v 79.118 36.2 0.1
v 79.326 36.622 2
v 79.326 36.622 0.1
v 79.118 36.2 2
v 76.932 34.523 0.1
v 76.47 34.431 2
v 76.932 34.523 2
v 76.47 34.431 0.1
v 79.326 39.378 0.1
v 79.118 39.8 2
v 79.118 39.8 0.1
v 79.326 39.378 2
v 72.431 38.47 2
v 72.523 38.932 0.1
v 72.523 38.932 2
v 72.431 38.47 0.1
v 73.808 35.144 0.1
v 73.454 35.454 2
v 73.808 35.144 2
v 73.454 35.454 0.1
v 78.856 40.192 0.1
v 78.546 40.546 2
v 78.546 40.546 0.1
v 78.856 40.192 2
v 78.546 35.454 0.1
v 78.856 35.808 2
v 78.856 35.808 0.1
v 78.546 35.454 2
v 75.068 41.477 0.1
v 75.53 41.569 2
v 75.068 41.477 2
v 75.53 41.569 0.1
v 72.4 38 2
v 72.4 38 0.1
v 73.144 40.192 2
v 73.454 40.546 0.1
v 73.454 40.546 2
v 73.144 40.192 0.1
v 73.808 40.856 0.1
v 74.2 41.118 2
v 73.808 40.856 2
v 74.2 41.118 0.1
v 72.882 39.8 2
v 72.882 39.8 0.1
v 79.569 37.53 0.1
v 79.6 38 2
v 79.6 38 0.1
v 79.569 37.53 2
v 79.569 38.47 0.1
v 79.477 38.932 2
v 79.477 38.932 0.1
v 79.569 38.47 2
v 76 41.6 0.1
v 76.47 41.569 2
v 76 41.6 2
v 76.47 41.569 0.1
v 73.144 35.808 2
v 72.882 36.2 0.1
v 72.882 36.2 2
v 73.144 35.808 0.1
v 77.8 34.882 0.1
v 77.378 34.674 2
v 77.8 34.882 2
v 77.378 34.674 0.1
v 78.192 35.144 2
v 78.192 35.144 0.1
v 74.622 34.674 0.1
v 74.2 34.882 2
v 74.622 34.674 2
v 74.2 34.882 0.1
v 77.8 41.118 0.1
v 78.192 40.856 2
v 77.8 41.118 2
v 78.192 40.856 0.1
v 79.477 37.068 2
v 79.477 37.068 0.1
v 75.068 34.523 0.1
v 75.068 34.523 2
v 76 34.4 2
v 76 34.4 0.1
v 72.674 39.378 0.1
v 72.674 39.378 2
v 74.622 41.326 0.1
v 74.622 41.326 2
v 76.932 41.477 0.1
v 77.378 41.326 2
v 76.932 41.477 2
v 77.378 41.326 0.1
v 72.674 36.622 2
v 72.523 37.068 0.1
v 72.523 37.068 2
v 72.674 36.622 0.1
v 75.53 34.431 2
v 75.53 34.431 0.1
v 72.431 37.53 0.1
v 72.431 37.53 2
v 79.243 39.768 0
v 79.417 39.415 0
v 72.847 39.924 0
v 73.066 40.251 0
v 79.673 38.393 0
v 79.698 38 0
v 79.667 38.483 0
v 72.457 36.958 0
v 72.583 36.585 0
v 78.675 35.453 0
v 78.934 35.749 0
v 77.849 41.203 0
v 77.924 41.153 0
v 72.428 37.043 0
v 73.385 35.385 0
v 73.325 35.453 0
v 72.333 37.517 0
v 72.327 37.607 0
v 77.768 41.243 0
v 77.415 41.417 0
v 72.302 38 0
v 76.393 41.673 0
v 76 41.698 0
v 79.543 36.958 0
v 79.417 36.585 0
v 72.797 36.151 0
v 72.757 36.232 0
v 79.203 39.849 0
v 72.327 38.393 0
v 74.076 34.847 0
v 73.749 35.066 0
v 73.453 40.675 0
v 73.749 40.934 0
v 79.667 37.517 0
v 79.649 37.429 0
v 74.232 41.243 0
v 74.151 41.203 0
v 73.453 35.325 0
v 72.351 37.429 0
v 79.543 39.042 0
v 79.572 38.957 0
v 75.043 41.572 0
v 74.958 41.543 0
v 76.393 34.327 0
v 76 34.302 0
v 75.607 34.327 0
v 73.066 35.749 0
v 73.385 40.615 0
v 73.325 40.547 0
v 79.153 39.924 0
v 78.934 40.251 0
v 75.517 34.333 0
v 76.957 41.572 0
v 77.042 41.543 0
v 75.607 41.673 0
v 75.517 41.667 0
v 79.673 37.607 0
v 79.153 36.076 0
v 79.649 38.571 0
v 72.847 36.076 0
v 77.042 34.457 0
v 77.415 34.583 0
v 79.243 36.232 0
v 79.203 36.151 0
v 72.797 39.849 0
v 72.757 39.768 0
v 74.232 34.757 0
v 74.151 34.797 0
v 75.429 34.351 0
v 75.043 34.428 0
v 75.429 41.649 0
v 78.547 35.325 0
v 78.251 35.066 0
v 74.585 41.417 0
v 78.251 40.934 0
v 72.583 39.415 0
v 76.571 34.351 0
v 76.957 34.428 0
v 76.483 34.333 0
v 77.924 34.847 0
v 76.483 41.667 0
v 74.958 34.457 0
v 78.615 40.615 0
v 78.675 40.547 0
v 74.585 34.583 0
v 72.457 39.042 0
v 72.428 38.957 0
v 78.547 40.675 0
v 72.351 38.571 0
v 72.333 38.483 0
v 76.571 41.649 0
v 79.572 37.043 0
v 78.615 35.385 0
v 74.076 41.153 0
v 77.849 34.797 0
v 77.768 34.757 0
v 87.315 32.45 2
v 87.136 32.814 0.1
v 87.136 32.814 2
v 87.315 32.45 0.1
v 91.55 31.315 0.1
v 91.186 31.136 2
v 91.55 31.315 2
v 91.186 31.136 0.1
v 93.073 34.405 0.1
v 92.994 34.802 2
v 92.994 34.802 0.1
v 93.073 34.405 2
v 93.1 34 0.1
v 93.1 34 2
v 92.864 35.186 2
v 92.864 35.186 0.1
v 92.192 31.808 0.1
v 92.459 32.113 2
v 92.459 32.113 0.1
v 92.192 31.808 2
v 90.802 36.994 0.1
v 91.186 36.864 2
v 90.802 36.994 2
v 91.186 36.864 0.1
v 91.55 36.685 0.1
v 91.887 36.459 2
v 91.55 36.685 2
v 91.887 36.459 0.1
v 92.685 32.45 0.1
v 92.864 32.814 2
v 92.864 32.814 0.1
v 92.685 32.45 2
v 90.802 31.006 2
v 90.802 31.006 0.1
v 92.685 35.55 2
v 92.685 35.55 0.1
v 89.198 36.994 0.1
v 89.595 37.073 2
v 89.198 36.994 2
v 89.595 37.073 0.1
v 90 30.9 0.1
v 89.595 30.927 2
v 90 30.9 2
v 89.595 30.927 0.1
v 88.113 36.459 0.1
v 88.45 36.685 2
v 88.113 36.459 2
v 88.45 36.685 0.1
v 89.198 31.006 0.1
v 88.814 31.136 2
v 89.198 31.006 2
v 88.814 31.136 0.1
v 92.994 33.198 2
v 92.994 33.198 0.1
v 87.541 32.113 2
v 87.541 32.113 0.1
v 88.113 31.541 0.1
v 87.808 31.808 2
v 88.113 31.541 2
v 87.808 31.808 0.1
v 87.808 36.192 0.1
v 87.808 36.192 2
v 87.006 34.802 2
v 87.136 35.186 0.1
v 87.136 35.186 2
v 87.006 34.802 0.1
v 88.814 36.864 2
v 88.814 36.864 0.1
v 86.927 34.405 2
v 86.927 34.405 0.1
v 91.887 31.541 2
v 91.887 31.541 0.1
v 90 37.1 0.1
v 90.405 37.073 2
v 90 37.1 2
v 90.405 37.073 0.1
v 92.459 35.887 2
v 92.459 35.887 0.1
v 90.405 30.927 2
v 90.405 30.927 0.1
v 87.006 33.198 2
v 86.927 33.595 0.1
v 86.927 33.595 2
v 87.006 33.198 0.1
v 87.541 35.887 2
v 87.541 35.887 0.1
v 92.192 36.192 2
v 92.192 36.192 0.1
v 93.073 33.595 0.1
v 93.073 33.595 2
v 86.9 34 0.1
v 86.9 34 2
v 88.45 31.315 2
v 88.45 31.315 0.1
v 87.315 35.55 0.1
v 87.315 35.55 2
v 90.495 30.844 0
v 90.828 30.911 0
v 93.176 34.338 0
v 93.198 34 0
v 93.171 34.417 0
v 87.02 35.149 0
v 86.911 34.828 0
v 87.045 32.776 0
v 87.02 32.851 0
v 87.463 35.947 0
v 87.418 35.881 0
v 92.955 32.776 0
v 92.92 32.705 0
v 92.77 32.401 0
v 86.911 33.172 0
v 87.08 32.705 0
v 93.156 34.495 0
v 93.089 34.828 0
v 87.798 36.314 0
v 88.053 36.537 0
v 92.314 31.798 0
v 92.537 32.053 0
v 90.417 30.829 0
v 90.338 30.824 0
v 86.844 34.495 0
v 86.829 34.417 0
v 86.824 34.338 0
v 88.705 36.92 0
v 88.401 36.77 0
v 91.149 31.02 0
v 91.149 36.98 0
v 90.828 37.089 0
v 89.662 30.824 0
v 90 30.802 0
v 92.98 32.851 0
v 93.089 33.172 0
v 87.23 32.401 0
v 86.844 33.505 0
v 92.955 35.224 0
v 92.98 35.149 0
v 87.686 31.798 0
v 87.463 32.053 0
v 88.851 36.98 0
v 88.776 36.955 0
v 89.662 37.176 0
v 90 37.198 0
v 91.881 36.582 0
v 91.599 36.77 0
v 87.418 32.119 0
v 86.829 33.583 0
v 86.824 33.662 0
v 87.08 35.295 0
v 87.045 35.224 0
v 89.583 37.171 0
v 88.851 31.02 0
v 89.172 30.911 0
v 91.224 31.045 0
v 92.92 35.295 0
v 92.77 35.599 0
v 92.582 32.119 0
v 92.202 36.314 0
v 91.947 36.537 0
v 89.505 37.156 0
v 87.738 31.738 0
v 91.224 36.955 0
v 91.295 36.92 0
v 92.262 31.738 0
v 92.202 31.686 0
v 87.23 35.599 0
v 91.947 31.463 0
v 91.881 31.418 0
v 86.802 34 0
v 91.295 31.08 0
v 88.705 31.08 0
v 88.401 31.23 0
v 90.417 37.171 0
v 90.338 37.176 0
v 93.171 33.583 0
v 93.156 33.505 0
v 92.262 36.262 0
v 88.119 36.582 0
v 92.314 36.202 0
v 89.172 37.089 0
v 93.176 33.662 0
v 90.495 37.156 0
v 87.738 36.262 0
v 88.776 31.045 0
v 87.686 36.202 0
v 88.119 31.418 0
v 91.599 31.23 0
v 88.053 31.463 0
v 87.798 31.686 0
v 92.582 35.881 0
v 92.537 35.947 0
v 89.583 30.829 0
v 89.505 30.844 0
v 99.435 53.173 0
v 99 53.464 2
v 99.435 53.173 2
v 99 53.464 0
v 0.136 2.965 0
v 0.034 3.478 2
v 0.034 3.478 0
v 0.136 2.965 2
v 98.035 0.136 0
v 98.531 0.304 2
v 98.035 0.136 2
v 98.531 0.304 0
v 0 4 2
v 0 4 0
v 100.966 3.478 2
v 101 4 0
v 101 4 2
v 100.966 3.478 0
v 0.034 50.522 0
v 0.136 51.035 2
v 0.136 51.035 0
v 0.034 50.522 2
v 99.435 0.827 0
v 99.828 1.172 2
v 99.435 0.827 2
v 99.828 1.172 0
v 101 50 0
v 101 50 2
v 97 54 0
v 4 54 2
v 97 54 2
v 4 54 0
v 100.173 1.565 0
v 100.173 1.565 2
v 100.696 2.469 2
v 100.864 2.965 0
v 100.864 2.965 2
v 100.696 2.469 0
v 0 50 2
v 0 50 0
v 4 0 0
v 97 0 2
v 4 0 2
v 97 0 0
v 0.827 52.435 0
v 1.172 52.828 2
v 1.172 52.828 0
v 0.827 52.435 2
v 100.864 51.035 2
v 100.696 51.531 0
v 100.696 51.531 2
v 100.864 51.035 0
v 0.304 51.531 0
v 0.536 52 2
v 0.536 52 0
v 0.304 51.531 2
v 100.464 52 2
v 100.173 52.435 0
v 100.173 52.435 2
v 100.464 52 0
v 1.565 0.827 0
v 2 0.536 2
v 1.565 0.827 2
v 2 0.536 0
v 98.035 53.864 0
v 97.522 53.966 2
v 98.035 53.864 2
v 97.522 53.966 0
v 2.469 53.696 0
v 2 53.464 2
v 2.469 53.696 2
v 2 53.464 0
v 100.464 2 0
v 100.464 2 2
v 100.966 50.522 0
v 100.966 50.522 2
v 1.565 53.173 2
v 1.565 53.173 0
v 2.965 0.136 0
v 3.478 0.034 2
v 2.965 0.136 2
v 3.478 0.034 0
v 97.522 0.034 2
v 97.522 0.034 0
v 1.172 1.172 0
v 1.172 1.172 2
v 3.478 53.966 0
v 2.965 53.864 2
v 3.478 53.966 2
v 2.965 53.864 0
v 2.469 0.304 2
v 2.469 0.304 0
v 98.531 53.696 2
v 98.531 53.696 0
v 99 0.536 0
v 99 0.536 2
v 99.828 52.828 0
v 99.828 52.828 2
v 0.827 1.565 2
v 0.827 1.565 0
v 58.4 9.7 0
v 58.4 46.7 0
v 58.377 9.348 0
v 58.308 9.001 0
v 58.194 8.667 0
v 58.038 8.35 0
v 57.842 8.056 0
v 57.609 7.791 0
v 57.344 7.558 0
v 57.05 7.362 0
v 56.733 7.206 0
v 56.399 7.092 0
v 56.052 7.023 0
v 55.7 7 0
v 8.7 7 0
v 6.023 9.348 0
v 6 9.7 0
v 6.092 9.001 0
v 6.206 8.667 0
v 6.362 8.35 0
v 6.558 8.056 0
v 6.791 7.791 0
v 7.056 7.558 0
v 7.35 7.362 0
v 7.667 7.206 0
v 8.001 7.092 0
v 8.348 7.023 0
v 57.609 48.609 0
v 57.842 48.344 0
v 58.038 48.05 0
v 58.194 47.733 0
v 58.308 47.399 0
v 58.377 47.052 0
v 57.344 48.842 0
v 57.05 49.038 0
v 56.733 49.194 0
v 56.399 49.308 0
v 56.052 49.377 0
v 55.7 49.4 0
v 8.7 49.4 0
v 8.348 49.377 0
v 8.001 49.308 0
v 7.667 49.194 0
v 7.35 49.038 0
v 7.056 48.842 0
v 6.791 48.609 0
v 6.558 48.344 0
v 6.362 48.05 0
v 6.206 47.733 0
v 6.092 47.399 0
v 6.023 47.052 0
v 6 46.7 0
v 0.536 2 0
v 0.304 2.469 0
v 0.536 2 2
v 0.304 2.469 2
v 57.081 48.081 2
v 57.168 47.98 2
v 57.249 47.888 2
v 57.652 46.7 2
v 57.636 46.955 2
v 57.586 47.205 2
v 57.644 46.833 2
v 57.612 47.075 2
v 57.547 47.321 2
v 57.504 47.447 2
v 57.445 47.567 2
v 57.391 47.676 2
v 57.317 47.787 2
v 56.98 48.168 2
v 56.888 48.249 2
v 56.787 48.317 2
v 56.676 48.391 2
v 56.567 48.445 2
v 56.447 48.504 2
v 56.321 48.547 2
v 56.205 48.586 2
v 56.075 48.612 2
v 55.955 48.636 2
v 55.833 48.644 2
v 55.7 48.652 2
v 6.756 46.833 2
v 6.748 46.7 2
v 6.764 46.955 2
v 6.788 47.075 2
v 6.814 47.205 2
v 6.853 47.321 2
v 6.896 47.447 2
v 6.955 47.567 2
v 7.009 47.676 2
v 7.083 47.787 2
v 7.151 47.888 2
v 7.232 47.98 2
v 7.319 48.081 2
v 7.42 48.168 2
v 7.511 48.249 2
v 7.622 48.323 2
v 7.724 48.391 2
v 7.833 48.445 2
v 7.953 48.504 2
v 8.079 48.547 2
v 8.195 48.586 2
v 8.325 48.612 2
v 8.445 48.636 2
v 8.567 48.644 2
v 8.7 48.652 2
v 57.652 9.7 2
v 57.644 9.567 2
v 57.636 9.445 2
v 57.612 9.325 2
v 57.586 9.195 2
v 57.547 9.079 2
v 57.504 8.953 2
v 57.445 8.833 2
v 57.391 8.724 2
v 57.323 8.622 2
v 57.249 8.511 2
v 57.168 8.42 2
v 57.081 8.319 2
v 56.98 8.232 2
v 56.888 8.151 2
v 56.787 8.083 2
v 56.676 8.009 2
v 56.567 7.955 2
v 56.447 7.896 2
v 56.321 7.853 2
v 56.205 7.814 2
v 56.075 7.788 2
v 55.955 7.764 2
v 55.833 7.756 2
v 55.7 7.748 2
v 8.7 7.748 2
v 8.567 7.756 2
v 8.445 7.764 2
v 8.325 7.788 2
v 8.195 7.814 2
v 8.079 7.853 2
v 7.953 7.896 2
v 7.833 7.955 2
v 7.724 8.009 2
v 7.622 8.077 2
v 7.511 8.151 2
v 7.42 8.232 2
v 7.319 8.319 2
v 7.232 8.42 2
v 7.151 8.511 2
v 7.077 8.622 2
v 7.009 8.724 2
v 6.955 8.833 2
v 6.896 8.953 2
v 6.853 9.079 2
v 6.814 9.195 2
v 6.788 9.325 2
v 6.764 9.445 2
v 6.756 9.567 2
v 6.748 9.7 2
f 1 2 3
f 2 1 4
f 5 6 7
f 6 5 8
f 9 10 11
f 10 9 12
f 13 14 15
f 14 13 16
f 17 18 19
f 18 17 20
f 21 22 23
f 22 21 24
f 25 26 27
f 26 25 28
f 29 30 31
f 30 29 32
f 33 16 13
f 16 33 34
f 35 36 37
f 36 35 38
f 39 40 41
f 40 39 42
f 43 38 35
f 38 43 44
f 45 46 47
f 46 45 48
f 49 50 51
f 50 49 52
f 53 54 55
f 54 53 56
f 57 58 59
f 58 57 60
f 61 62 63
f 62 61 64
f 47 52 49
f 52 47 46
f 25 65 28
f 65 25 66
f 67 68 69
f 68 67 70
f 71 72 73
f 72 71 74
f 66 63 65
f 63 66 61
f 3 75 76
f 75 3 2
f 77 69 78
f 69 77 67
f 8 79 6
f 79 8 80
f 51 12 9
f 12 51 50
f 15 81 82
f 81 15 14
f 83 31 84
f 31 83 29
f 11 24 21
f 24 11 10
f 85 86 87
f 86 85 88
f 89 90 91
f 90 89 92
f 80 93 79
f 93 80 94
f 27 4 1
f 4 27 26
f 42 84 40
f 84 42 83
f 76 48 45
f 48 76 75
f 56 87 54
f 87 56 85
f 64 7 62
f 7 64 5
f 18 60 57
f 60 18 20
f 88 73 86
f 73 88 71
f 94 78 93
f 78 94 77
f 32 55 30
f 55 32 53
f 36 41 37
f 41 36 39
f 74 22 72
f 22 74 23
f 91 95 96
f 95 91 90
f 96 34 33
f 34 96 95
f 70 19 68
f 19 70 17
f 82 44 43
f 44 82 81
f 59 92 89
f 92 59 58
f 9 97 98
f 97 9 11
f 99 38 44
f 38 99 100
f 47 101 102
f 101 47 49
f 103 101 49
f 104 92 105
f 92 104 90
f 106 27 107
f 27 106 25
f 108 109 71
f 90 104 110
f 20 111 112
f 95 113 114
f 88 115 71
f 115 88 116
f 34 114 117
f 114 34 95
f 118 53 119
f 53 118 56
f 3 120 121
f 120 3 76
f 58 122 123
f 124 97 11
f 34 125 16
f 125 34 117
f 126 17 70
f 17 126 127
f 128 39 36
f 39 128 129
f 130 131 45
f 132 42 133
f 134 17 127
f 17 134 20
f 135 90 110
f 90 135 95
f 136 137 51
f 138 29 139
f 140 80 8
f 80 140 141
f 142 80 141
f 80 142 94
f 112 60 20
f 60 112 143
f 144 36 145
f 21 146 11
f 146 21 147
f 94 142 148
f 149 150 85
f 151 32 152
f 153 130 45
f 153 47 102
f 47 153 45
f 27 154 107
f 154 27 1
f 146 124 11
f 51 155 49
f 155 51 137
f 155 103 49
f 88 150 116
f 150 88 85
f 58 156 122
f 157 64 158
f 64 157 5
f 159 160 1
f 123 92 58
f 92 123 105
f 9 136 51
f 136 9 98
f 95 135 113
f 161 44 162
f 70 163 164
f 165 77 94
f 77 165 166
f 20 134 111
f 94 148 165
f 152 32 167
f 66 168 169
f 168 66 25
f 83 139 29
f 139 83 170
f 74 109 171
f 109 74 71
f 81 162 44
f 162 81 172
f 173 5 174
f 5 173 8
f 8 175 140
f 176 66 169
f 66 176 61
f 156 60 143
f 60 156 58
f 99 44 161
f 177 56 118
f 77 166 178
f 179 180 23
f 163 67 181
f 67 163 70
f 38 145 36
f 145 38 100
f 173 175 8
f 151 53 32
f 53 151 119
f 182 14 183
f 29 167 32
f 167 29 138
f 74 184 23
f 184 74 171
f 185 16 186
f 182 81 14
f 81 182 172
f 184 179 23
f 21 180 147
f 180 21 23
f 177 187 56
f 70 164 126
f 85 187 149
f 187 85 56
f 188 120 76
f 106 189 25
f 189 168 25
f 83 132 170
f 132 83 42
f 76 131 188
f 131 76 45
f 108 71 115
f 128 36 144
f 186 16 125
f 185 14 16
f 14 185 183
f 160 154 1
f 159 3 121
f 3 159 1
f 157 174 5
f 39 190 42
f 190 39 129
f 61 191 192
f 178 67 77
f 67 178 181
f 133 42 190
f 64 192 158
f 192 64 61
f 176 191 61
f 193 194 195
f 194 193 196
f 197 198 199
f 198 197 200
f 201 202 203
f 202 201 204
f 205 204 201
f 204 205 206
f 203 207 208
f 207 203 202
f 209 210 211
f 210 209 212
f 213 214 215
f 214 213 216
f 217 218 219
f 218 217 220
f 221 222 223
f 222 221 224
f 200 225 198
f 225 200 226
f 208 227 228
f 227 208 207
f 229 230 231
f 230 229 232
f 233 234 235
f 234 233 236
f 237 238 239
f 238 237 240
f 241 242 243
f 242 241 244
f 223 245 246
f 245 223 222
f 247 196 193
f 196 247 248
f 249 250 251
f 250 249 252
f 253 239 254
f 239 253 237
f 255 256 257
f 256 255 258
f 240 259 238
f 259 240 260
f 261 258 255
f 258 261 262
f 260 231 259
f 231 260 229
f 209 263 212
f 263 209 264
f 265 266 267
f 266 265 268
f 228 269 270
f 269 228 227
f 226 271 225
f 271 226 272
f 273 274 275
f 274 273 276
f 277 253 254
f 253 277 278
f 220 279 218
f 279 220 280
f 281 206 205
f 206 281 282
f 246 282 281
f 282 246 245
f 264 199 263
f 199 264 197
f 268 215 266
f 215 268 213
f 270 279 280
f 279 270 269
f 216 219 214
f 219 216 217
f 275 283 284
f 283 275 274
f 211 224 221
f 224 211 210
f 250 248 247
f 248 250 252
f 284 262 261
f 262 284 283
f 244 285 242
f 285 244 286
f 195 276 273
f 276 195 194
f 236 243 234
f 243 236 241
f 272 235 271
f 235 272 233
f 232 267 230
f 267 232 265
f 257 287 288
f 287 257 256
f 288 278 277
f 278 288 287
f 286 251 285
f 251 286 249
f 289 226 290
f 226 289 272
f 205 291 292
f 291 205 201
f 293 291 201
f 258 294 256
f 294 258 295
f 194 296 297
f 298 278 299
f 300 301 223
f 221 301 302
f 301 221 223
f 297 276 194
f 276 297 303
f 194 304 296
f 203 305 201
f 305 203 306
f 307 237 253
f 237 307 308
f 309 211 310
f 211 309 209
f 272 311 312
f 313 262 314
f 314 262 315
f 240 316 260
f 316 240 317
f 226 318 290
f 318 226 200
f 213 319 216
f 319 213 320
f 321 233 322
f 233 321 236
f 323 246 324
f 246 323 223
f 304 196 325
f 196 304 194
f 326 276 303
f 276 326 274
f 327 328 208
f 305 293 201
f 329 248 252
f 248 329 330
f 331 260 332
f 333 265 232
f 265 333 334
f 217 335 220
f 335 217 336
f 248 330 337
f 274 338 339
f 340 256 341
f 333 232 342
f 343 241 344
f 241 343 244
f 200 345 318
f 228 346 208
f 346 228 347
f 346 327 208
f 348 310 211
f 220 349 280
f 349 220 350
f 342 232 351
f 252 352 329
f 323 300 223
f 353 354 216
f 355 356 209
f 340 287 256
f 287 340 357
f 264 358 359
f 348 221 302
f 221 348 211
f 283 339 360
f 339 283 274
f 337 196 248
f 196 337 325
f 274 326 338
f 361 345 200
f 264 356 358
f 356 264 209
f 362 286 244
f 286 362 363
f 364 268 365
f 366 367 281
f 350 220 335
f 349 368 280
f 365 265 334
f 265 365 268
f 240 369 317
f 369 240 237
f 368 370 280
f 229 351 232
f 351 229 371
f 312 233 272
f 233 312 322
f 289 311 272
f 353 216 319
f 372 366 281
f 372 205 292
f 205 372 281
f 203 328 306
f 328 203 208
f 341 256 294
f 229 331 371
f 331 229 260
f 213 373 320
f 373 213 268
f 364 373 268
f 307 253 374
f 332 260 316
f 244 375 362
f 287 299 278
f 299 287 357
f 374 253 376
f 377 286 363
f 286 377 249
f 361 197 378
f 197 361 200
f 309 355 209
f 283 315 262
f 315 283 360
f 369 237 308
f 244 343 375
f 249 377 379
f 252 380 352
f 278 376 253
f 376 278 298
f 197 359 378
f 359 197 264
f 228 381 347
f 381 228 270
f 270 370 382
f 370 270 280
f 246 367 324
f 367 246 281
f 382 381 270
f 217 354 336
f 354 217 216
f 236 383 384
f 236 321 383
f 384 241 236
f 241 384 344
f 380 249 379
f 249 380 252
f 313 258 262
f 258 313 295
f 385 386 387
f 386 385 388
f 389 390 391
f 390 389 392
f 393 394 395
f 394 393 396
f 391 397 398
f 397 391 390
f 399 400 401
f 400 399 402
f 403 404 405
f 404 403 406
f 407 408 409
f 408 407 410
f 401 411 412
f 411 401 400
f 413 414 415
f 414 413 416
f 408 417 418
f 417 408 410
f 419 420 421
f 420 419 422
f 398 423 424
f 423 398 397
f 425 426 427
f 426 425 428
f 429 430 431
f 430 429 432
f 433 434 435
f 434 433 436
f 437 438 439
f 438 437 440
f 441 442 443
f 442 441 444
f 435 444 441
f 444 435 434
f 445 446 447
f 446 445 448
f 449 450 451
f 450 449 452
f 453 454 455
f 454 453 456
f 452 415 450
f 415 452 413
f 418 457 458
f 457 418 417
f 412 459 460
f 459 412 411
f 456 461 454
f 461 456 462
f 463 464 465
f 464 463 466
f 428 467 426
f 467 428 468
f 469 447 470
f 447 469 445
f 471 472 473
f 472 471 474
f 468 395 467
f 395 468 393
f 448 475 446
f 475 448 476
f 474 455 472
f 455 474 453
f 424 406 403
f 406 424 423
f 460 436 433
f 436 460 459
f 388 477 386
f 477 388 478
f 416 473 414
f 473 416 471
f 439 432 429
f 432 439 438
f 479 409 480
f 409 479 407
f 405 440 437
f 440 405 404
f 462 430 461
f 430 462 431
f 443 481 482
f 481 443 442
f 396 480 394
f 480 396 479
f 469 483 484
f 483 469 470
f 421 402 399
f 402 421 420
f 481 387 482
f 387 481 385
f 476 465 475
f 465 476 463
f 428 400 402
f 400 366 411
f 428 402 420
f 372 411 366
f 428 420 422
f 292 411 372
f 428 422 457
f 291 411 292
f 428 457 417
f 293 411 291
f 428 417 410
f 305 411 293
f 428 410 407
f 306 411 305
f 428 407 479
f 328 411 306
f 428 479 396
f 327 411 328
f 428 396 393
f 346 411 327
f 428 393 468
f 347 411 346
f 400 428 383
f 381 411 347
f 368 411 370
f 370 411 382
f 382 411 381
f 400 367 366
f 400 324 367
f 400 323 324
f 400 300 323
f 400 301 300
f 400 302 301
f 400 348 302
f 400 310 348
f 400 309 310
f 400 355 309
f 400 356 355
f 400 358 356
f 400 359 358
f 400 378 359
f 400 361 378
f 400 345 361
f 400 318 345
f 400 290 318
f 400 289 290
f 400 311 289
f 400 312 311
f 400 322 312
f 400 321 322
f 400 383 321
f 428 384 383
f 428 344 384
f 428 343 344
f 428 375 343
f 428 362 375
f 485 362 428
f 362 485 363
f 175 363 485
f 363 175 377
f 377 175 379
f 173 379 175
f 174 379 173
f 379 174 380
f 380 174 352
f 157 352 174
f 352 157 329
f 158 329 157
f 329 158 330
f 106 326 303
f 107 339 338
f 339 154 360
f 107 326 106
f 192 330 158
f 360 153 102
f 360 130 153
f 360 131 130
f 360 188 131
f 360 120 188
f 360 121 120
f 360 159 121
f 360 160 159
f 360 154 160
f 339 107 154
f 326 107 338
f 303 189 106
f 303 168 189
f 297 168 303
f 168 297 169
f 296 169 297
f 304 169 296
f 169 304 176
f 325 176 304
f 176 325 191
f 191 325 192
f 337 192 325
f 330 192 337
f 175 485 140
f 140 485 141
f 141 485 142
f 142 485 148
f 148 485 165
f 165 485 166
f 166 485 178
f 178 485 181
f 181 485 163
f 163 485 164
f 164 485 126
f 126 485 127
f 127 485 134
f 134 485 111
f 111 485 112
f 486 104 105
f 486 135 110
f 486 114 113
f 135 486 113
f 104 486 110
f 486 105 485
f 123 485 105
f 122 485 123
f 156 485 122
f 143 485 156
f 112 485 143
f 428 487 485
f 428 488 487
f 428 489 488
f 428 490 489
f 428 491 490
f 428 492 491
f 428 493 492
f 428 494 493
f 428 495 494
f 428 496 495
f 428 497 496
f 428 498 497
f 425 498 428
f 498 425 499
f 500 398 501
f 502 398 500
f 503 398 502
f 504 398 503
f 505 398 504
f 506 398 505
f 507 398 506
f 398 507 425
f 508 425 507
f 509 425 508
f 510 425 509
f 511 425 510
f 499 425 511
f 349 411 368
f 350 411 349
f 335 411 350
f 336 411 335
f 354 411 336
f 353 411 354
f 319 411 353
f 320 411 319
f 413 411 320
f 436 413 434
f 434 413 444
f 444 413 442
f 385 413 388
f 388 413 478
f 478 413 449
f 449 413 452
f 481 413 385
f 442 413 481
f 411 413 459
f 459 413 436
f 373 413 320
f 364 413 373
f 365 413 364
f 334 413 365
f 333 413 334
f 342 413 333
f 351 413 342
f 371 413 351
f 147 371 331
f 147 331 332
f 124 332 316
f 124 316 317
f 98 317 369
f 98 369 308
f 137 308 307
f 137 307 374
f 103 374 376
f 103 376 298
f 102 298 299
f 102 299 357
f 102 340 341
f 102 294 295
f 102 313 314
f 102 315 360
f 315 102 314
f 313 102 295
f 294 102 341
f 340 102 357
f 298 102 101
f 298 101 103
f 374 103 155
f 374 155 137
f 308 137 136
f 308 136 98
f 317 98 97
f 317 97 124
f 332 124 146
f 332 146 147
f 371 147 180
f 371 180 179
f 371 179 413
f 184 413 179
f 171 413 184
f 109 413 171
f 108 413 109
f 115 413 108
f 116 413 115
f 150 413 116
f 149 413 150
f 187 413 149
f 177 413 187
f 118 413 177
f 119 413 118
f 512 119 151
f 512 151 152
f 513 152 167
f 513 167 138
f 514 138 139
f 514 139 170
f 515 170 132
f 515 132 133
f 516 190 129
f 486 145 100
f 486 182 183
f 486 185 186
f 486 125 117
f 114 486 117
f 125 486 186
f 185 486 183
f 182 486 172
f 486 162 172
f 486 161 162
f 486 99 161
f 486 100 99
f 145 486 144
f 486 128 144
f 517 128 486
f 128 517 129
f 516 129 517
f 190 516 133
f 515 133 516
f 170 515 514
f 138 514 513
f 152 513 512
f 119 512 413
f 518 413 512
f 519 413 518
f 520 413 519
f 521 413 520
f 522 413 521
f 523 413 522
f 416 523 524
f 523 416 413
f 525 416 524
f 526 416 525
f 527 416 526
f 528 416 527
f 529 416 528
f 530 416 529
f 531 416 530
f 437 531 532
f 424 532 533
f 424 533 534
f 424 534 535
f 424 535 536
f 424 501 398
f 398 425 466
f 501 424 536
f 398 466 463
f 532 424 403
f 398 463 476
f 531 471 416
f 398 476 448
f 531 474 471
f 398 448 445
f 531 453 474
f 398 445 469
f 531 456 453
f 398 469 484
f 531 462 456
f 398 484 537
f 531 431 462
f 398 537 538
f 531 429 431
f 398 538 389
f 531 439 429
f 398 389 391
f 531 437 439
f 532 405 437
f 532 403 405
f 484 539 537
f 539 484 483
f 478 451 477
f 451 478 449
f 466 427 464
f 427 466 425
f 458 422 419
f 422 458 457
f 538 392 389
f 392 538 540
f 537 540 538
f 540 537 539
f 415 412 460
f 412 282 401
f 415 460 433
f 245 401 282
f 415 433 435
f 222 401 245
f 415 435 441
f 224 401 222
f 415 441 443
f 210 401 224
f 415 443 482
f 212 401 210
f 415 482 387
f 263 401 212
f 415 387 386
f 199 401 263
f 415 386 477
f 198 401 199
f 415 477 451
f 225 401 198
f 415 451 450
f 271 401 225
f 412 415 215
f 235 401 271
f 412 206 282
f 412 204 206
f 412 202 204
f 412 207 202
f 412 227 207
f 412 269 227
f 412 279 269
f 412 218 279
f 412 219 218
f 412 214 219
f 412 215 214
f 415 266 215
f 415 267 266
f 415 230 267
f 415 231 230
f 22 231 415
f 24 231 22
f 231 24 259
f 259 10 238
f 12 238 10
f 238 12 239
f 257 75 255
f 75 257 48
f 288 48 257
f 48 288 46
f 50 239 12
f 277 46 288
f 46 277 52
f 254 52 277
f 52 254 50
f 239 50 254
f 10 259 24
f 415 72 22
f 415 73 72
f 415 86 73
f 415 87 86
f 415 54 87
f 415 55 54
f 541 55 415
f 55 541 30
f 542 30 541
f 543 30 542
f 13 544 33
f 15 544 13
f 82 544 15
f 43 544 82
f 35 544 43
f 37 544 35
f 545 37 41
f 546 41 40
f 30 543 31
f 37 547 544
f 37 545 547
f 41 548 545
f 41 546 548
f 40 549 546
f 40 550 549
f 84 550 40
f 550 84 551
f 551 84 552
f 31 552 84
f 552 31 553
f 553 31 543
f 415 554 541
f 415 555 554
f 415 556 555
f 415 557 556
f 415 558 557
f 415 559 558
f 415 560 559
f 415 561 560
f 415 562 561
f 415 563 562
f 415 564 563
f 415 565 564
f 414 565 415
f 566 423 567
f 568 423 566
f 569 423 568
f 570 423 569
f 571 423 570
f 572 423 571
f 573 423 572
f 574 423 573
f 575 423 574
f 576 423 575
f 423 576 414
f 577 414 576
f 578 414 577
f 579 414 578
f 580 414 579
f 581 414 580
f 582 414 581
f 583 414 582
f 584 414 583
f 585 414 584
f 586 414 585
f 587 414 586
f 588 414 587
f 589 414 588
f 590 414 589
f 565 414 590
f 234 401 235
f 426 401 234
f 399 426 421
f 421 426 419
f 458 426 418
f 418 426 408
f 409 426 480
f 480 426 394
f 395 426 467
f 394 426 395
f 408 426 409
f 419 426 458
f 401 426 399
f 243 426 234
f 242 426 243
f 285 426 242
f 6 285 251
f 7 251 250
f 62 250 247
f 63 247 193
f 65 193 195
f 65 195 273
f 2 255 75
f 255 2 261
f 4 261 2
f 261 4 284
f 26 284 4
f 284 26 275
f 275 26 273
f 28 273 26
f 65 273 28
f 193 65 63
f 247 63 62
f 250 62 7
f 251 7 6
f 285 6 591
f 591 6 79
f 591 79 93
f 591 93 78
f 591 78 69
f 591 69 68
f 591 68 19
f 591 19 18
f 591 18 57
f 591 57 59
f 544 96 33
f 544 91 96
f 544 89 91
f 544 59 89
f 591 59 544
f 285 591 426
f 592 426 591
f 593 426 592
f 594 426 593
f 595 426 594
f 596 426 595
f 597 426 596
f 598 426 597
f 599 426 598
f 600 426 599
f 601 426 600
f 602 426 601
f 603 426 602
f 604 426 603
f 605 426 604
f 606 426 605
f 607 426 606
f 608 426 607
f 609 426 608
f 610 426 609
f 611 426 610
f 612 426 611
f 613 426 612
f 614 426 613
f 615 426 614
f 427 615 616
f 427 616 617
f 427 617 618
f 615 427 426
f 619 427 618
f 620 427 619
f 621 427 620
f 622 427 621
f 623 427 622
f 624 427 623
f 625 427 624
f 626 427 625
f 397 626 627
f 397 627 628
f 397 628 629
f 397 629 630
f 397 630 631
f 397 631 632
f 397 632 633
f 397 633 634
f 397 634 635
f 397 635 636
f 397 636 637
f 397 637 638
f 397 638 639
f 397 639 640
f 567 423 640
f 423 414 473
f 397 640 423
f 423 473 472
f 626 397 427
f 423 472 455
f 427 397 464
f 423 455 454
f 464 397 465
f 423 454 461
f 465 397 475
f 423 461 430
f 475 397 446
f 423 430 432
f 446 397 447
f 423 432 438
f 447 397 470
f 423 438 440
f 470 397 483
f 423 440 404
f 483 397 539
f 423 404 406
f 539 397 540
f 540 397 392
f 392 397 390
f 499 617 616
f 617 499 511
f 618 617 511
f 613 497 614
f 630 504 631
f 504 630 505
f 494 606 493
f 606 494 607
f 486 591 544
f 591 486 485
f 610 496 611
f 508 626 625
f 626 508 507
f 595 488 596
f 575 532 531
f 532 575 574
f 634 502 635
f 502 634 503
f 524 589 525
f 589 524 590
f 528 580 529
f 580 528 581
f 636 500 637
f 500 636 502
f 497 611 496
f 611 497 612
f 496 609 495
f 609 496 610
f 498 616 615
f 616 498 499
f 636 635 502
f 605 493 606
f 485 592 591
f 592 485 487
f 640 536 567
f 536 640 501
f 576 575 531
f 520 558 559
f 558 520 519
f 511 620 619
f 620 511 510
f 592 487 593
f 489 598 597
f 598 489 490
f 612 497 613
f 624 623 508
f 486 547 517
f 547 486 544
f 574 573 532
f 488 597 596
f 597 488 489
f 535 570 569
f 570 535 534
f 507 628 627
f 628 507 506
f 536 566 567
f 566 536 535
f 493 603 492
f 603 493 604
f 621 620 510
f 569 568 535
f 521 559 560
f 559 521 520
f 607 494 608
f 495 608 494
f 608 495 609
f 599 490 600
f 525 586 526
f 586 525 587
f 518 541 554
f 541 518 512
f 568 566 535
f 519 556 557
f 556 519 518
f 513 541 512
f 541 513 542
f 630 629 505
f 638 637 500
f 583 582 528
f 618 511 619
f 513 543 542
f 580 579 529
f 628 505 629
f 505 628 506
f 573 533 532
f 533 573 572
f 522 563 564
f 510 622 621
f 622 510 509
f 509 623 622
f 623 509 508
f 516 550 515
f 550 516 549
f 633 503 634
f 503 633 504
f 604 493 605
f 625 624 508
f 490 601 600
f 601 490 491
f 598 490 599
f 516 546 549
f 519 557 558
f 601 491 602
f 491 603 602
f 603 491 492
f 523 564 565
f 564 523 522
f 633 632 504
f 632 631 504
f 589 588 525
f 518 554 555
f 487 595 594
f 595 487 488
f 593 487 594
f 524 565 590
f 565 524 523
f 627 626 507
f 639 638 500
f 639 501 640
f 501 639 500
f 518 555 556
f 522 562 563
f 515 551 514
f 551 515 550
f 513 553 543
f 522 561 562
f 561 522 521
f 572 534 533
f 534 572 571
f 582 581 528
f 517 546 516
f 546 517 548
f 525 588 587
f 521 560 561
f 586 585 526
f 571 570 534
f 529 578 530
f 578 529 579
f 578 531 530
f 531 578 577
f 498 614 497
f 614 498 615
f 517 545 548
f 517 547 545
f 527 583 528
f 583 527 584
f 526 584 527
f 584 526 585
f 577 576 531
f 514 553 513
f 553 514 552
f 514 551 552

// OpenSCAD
// FlugVel enclosure - v2 DRAFT, "premium" pass
// One-piece case for the SZHJW "2.4 TFT + EC11" display/encoder/button board
// with an ESP32-D DevKit (38-pin DOIT-style clone) stacked directly behind it,
// wired together internally through a slot instead of routed outside the case.
//
// Styling pass on top of the v1 functional draft: soft-rounded corners
// (like an injection-molded shell, not a raw box), a chamfered lip around
// the display glass so the bezel doesn't look like a laser-cut plate, a
// recessed rabbet seam where the lid meets the shell (a thin, tight
// reveal line instead of a visible butt joint - this is most of what
// makes a print look "expensive" vs. "hobby project"), and an engraved
// logo on the back.
//
// All dimensions are either measured from the Printables STLs (display
// board) or standard published figures for the DOIT ESP32 DevKit v1 clone -
// NOT verified against your physical parts with calipers. Print
// PRINT_MODE="test" first (just the front panel) and check the fit before
// committing to a full print - see the comment block below it.
//
// Render/export: install OpenSCAD (openscad.org, free), open this file.
// F5 = preview, F6 = full render, then File > Export > Export as STL.
// $fn is kept modest (32-64) for preview speed - bump RENDER_FN below for
// the final export if you want smoother curves.

/* ---------------- PRINT MODE ----------------
   "test"     - just the front panel, for a fast fit-check print
   "shell"    - the full case shell (front + ESP32 back compartment), no lid
   "lid"      - just the back lid
   "assembly" - shell + lid laid out side by side, for previewing together
*/
PRINT_MODE = "test";
RENDER_FN = 48;

/* ---------------- DISPLAY BOARD (measured from STL) ---------------- */
BOARD_L = 97.0;
BOARD_W = 50.0;
BOARD_T = 1.8;

FRONT_COMP_H = 11.0;   // encoder body + button housing height above the PCB (not the knob)
BACK_COMP_H  = 9.0;    // header pins / solder side height behind the PCB

// Display glass cutout - ADJUST after test-fitting, this is the number
// most worth double-checking against your real board.
DISP_CUT_L = 50.0;
DISP_CUT_W = 40.0;
DISP_CUT_X = 4.0;
DISP_CUT_Y = (BOARD_W - DISP_CUT_W) / 2;
DISP_BEVEL = 1.2;      // chamfer depth around the window, outward-facing side

// Encoder shaft + push-button holes, front panel.
ENC_HOLE_D = 7.2;
ENC_HOLE_X = 74.0;
ENC_HOLE_Y = 36.0;
BTN_HOLE_D = 6.2;
BTN_HOLE_X = 88.0;
BTN_HOLE_Y = 32.0;
HOLE_COUNTERSINK = 0.6; // shallow recess around each hole so knob/cap sit flush, not proud

BOARD_HOLE_INSET = 4.0;
BOARD_HOLE_D     = 2.4;
BOARD_BOSS_D     = 6.0;

/* ---------------- ESP32 DEVKIT (standard DOIT v1 clone figures) ---------------- */
ESP_L = 50.0;
ESP_W = 27.0;
ESP_COMP_H = 8.0;
ESP_HOLE_INSET = 3.0;
ESP_HOLE_D = 2.2;
ESP_BOSS_D = 5.0;

USB_CUT_W = 10.5;
USB_CUT_H = 5.0;

/* ---------------- SHARED / STYLING ---------------- */
WALL = 2.0;
WIRE_GAP = 6.0;
CORNER_R = 4.0;         // outer-perimeter corner radius - the main "not a box" cue
SEAM_LIP = 1.0;          // depth of the recessed rabbet the lid sits into
SEAM_GAP = 0.15;         // per-side clearance in the rabbet so the lid seats without forcing
LOGO_TEXT = "FLUGVEL";
LOGO_SIZE = 6;
LOGO_DEPTH = 0.4;        // engraved, not embossed - cleaner under paint/light

/* ==================== derived ==================== */
CASE_L = BOARD_L + 2 * WALL;
CASE_W = BOARD_W + 2 * WALL;
FRONT_DEPTH = WALL + FRONT_COMP_H;
MID_DEPTH   = BOARD_T + BACK_COMP_H + WIRE_GAP;
ESP_DEPTH   = ESP_COMP_H + 1.5;
SHELL_D     = FRONT_DEPTH + MID_DEPTH + ESP_DEPTH; // shell depth, open back face
CASE_D      = SHELL_D + WALL;                       // + lid

/* ---------------- primitives ---------------- */

// 2D rounded rectangle, corners only (flat top/bottom when extruded - this
// is what makes a case look "molded" without turning every edge into a
// ball-nosed blob).
module rrect(l, w, r) {
    hull() {
        for (x = [r, l - r])
            for (y = [r, w - r])
                translate([x, y]) circle(r = r, $fn = RENDER_FN);
    }
}

module rrect_prism(l, w, h, r) {
    linear_extrude(height = h) rrect(l, w, r);
}

module corner_bosses(l, w, inset, hole_d, boss_d, h) {
    for (x = [inset, l - inset])
        for (y = [inset, w - inset])
            translate([x, y, 0])
                difference() {
                    cylinder(d = boss_d, h = h, $fn = 32);
                    translate([0, 0, -0.5]) cylinder(d = hole_d, h = h + 1, $fn = 24);
                }
}

// Chamfered cutter: a frustum that's DISP_BEVEL wider at z=0 (outward face)
// than at z=depth, so the window edge reads as a machined bevel instead of
// a raw vertical wall.
module beveled_window(l, w, r, depth, bevel) {
    hull() {
        translate([0, 0, 0])          rrect_prism(l + 2 * bevel, w + 2 * bevel, 0.01, r + bevel);
        translate([bevel, bevel, bevel]) rrect_prism(l, w, depth, r);
    }
}

module countersunk_hole(d, h, sink) {
    union() {
        cylinder(d = d, h = h, $fn = RENDER_FN);
        translate([0, 0, -0.01])
            cylinder(d1 = d + 2 * sink, d2 = d, h = sink + 0.01, $fn = RENDER_FN);
    }
}

/* ---------------- body ---------------- */

module front_panel() {
    difference() {
        rrect_prism(CASE_L, CASE_W, WALL, CORNER_R);

        translate([WALL + DISP_CUT_X, WALL + DISP_CUT_Y, -0.01])
            beveled_window(DISP_CUT_L, DISP_CUT_W, 1.5, WALL + 0.02, DISP_BEVEL);

        translate([WALL + ENC_HOLE_X, WALL + ENC_HOLE_Y, -0.5])
            countersunk_hole(ENC_HOLE_D, WALL + 1, HOLE_COUNTERSINK);
        translate([WALL + BTN_HOLE_X, WALL + BTN_HOLE_Y, -0.5])
            countersunk_hole(BTN_HOLE_D, WALL + 1, HOLE_COUNTERSINK);
    }
}

module display_side_walls() {
    difference() {
        rrect_prism(CASE_L, CASE_W, FRONT_DEPTH + MID_DEPTH, CORNER_R);
        translate([WALL, WALL, -1])
            cube([BOARD_L, BOARD_W, FRONT_DEPTH + MID_DEPTH + 2]);
    }
}

module esp_compartment() {
    esp_l = ESP_L + 2 * WALL;
    esp_w = ESP_W + 2 * WALL;
    x0 = (CASE_L - esp_l) / 2;
    y0 = (CASE_W - esp_w) / 2;

    difference() {
        translate([x0, y0, 0]) rrect_prism(esp_l, esp_w, ESP_DEPTH + WALL, CORNER_R * 0.6);
        translate([x0 + WALL, y0 + WALL, WALL])
            cube([ESP_L, ESP_W, ESP_DEPTH + 1]);

        translate([x0 + esp_l / 2 - USB_CUT_W / 2, y0 - 1, WALL + (ESP_DEPTH - USB_CUT_H) / 2])
            cube([USB_CUT_W, WALL + 2, USB_CUT_H]);
    }

    translate([x0 + WALL, y0 + WALL, WALL])
        corner_bosses(ESP_L, ESP_W, ESP_HOLE_INSET, ESP_HOLE_D, ESP_BOSS_D, 3);
}

module case_shell() {
    difference() {
        union() {
            front_panel();
            translate([0, 0, WALL]) display_side_walls();
            translate([0, 0, WALL]) corner_bosses(CASE_L, CASE_W, BOARD_HOLE_INSET + WALL,
                                                    BOARD_HOLE_D, BOARD_BOSS_D, FRONT_COMP_H - 2);
            translate([0, 0, FRONT_DEPTH + MID_DEPTH]) esp_compartment();
        }
        // recessed rabbet the lid seats into, cut into the open back face -
        // this is the tight-reveal seam instead of a butt joint.
        translate([WALL + SEAM_GAP, WALL + SEAM_GAP, SHELL_D - SEAM_LIP])
            rrect_prism(CASE_L - 2 * (WALL + SEAM_GAP), CASE_W - 2 * (WALL + SEAM_GAP),
                        SEAM_LIP + 0.5, max(CORNER_R - WALL, 0.5));
    }
}

module lid() {
    difference() {
        rrect_prism(CASE_L, CASE_W, WALL, CORNER_R);
        // engraved logo, back face
        translate([CASE_L / 2, CASE_W / 2, WALL - LOGO_DEPTH])
            linear_extrude(height = LOGO_DEPTH + 0.01)
                text(LOGO_TEXT, size = LOGO_SIZE, halign = "center", valign = "center",
                     font = "Liberation Sans:style=Bold");
    }
    // the tab that presses into case_shell()'s rabbet
    translate([WALL + SEAM_GAP + 0.05, WALL + SEAM_GAP + 0.05, -SEAM_LIP])
        rrect_prism(CASE_L - 2 * (WALL + SEAM_GAP) - 0.1, CASE_W - 2 * (WALL + SEAM_GAP) - 0.1,
                    SEAM_LIP, max(CORNER_R - WALL, 0.5));
}

/* ==================== output ==================== */
if (PRINT_MODE == "test") {
    front_panel();
} else if (PRINT_MODE == "shell") {
    case_shell();
} else if (PRINT_MODE == "lid") {
    lid();
} else if (PRINT_MODE == "assembly") {
    case_shell();
    translate([CASE_L + 15, 0, 0]) lid();
}
